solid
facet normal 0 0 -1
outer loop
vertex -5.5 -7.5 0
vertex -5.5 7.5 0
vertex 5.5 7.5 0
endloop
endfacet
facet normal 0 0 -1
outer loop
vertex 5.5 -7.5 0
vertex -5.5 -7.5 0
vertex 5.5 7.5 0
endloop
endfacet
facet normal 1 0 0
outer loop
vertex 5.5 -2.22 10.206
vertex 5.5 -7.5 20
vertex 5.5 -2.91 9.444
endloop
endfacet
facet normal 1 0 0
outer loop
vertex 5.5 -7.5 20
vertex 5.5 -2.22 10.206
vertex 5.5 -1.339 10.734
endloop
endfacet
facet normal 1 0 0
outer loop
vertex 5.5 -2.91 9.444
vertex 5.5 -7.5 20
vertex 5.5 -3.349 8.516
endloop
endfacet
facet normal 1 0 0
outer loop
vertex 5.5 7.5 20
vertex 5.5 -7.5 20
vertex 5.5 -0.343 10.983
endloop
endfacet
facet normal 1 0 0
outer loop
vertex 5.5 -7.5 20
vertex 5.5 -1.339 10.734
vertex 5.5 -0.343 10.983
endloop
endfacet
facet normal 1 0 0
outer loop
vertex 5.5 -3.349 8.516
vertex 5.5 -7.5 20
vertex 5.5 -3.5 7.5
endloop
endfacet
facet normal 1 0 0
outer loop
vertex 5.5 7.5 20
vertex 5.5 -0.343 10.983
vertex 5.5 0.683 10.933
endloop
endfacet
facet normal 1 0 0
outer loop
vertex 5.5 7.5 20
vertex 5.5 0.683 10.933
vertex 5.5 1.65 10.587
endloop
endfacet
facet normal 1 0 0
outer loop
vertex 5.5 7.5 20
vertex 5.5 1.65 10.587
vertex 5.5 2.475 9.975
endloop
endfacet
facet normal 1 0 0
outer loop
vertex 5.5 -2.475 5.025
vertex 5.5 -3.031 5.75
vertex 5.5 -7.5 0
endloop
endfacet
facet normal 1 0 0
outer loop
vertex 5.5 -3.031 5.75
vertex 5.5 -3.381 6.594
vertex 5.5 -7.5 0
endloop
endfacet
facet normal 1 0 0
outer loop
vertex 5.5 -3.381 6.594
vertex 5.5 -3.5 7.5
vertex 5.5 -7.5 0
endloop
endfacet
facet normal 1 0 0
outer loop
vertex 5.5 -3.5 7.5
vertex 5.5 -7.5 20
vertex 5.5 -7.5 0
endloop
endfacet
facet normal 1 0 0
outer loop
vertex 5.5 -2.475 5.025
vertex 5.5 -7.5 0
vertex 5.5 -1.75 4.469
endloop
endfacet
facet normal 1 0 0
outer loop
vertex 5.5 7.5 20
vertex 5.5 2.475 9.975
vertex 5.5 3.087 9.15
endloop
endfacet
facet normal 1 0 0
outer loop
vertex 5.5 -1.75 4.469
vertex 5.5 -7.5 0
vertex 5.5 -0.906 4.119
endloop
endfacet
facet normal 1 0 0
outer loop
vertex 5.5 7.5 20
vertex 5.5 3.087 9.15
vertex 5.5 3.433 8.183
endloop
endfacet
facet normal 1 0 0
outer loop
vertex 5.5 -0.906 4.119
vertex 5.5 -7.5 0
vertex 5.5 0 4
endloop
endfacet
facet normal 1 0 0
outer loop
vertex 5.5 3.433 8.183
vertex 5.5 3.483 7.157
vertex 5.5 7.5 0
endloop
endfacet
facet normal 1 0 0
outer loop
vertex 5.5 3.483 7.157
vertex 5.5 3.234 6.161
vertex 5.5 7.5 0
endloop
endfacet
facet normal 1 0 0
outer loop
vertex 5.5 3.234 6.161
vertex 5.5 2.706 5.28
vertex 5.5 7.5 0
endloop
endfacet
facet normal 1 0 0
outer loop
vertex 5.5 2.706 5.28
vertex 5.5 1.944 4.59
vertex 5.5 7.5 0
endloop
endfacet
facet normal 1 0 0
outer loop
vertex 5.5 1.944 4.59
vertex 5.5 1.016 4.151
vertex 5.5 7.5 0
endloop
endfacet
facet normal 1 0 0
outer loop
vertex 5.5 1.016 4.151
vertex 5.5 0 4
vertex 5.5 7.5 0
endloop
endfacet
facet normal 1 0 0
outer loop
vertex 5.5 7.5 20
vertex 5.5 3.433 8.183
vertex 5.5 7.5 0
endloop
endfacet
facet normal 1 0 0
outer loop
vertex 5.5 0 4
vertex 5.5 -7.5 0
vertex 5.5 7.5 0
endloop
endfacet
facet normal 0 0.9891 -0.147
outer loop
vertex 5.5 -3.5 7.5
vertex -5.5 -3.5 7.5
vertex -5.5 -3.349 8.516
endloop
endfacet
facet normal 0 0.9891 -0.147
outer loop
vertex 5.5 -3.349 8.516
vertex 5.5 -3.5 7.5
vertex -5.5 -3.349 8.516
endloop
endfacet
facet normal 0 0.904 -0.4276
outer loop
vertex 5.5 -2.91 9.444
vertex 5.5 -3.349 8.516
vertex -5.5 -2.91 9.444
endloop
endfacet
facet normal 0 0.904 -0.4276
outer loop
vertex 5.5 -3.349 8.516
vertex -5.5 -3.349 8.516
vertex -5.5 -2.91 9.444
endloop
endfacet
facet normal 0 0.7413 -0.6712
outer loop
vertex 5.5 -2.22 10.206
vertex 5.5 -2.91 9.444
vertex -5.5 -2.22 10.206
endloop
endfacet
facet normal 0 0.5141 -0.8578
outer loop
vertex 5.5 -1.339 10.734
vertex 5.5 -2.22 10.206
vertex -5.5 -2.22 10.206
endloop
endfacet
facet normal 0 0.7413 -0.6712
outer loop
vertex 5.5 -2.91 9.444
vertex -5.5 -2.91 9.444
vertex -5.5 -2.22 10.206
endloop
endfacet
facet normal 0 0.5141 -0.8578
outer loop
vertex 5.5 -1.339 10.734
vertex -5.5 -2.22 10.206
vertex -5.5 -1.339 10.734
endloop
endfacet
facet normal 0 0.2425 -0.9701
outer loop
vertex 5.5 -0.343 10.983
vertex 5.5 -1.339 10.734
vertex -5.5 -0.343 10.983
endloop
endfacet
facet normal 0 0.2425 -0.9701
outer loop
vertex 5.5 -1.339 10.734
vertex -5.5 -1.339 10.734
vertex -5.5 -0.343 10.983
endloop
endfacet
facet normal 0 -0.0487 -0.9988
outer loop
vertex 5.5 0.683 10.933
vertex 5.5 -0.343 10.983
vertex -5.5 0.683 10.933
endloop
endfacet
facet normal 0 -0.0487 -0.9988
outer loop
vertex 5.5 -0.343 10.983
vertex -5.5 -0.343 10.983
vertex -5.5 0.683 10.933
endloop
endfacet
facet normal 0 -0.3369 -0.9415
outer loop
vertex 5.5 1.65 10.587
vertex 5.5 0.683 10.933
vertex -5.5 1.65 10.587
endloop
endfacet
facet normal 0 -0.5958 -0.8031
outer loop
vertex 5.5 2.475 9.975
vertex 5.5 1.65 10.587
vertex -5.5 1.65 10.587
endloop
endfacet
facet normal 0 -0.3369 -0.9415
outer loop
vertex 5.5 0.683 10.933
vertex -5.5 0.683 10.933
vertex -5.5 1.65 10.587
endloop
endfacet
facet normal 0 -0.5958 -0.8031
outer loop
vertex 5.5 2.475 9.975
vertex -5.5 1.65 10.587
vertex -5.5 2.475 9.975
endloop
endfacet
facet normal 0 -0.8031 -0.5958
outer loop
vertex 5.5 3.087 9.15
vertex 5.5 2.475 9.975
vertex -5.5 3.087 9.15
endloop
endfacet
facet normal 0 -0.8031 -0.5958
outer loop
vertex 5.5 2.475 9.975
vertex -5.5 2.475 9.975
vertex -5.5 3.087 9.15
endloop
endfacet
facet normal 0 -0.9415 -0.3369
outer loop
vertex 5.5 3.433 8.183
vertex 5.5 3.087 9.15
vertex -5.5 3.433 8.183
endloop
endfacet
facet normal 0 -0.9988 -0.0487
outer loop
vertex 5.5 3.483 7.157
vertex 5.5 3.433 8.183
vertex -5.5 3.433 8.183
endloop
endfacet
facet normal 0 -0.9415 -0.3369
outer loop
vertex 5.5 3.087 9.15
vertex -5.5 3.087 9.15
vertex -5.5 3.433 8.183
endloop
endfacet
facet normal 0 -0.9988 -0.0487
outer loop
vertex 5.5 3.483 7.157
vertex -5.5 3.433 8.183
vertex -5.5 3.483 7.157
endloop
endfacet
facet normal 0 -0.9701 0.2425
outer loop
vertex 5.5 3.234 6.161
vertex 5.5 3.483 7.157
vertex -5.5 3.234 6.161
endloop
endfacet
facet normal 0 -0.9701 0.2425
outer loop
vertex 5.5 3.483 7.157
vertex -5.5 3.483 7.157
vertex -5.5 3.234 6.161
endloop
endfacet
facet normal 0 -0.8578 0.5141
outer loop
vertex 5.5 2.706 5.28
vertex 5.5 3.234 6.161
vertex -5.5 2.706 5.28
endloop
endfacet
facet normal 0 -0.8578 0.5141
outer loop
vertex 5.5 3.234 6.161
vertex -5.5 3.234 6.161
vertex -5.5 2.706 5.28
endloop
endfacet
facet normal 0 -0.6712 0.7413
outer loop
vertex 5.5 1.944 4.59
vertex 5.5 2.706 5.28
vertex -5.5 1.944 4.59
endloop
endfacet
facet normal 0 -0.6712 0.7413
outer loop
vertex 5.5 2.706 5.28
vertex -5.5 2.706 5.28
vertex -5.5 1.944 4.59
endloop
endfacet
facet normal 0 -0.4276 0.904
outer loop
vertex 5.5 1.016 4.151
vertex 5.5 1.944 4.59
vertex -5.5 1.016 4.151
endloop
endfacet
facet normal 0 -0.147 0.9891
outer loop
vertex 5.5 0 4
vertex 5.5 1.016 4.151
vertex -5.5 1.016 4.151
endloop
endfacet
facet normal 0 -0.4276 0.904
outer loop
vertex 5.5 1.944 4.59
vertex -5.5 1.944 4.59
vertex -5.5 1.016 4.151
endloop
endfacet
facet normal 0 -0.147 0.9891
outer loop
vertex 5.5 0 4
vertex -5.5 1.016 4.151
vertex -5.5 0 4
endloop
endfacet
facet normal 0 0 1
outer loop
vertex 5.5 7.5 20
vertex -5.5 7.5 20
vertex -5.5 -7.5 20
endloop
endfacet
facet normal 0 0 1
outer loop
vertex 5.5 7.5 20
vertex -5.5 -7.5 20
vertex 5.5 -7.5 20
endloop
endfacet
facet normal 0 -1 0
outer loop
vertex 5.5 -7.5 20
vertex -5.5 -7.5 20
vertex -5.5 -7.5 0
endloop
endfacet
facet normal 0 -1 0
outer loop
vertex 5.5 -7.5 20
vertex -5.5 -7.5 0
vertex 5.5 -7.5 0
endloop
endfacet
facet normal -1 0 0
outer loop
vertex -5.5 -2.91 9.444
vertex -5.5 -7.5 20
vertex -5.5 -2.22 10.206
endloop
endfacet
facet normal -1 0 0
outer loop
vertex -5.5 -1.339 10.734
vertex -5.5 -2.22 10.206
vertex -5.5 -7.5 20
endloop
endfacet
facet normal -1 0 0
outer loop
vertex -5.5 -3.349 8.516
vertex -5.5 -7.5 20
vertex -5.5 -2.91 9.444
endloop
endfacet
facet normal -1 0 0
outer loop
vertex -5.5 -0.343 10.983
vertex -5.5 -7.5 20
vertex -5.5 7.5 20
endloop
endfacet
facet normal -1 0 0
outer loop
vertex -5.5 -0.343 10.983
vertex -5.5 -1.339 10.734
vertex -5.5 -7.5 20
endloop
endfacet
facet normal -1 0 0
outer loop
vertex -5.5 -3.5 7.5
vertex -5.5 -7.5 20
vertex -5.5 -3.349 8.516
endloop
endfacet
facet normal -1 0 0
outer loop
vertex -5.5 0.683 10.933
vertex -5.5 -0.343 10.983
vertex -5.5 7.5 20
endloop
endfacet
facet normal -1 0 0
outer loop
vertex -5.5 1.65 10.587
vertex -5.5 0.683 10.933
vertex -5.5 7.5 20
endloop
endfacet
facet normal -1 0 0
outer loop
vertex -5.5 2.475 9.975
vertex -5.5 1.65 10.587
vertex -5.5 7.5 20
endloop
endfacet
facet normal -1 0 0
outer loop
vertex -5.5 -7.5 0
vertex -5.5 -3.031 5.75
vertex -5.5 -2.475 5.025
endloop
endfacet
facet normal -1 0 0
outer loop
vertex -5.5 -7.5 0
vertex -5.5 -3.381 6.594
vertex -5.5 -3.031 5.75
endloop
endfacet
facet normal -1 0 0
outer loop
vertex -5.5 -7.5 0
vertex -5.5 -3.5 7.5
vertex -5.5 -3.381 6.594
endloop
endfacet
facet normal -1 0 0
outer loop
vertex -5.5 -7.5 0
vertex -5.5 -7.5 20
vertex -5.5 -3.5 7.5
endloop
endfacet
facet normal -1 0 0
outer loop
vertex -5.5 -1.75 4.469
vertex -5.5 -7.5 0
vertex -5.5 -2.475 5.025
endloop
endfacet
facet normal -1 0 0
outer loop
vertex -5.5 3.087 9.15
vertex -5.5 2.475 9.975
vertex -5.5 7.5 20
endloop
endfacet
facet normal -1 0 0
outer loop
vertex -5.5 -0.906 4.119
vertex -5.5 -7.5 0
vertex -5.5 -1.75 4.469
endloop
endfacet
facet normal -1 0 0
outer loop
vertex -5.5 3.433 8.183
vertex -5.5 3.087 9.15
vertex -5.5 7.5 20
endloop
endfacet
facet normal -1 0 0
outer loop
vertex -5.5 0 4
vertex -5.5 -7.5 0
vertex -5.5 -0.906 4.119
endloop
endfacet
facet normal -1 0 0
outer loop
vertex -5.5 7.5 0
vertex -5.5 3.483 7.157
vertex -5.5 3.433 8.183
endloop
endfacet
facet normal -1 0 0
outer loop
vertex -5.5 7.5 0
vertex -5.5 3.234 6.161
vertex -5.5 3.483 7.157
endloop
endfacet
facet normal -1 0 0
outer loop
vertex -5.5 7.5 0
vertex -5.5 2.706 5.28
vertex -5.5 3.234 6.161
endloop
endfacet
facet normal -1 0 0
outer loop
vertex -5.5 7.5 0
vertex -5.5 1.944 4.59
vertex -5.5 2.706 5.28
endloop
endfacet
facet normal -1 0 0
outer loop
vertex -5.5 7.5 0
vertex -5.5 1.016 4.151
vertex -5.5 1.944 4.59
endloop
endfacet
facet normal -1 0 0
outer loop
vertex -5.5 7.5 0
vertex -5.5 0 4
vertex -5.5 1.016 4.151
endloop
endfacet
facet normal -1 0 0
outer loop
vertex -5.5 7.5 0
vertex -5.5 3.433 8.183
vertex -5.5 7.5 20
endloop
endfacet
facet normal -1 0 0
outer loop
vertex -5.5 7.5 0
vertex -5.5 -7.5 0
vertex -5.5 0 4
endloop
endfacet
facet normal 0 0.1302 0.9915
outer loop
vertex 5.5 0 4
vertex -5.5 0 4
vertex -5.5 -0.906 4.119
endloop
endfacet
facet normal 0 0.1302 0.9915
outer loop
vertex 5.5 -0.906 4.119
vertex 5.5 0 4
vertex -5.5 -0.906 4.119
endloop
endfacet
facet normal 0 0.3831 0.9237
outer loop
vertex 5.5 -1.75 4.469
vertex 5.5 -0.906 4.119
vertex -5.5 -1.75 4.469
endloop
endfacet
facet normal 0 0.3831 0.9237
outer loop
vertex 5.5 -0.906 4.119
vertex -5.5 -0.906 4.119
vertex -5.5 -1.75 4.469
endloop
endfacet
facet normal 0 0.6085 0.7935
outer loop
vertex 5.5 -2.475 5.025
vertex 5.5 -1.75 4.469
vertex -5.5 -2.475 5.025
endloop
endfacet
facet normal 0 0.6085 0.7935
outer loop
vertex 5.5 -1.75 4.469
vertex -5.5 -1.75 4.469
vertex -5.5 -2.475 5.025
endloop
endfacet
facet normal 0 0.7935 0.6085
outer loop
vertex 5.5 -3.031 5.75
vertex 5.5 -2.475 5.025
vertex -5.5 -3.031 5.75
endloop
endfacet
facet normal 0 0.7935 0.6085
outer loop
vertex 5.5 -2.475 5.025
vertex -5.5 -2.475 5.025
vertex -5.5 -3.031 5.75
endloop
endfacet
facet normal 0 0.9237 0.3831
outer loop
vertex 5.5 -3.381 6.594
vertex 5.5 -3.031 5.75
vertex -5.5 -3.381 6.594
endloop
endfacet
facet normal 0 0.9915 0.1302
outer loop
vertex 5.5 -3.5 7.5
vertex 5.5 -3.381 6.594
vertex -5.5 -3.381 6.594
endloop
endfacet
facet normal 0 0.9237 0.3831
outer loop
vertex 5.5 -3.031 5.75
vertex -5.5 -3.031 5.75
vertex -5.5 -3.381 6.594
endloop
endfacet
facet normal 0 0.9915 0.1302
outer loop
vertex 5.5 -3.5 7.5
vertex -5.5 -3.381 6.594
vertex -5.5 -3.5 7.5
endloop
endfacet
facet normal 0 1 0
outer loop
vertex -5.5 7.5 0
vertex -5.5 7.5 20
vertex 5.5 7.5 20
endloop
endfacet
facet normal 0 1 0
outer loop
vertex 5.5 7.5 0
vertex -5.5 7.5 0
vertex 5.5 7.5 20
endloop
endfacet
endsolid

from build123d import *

# Parameters (mm, degrees)
F0_W     = 11
F0_H     = 15
F2_DEPTH = 20
F3_DEPTH = 19
F6_DEPTH = 15


with BuildPart() as f2:
    # F0 (on Top) → F2 (new body)
    with BuildSketch(Plane.XY):
        Rectangle(F0_W, F0_H)
    extrude(amount=F2_DEPTH)


with BuildPart() as f3:
    # F1 (on Top) → F3 (new body)
    with BuildSketch(Plane.XY):
        with BuildLine():
            ThreePointArc((9.9780160072, 0.6627190658), (-8.9648731573, -4.4306939945), (6.5869096361, 7.5241359269))
            Line((6.5869096361, 7.5241359269), (7.9042915633, 9.0289631123))
            ThreePointArc((7.9042915633, 9.0289631123), (-10.7578477888, -5.3168327934), (11.9736192086, 0.7952628789))
            Line((11.9736192086, 0.7952628789), (9.9780160072, 0.6627190658))
        make_face()
    extrude(amount=F3_DEPTH)


with BuildPart() as f6_tool:
    # F5 (on offset) → F6 (new body)
    with BuildSketch(Plane(origin=(-5.5, 0, 0), x_dir=(0, -1, 0), z_dir=(-1, 0, 0))):
        with BuildLine():
            ThreePointArc((0, 4), (2.4748737342, 5.0251262658), (3.5, 7.5))
            ThreePointArc((3.5, 7.5), (-2.4748737342, 9.9748737342), (0, 4))
        make_face()
    extrude(amount=-F6_DEPTH)


with BuildPart() as f2_1:
    add(f2.part)

    # F6: cut by f6_tool
    add(f6_tool.part, mode=Mode.SUBTRACT)


with BuildPart() as f3_1:
    add(f3.part)

    # F6: cut by f6_tool
    add(f6_tool.part, mode=Mode.SUBTRACT)


solid = f2_1.part
